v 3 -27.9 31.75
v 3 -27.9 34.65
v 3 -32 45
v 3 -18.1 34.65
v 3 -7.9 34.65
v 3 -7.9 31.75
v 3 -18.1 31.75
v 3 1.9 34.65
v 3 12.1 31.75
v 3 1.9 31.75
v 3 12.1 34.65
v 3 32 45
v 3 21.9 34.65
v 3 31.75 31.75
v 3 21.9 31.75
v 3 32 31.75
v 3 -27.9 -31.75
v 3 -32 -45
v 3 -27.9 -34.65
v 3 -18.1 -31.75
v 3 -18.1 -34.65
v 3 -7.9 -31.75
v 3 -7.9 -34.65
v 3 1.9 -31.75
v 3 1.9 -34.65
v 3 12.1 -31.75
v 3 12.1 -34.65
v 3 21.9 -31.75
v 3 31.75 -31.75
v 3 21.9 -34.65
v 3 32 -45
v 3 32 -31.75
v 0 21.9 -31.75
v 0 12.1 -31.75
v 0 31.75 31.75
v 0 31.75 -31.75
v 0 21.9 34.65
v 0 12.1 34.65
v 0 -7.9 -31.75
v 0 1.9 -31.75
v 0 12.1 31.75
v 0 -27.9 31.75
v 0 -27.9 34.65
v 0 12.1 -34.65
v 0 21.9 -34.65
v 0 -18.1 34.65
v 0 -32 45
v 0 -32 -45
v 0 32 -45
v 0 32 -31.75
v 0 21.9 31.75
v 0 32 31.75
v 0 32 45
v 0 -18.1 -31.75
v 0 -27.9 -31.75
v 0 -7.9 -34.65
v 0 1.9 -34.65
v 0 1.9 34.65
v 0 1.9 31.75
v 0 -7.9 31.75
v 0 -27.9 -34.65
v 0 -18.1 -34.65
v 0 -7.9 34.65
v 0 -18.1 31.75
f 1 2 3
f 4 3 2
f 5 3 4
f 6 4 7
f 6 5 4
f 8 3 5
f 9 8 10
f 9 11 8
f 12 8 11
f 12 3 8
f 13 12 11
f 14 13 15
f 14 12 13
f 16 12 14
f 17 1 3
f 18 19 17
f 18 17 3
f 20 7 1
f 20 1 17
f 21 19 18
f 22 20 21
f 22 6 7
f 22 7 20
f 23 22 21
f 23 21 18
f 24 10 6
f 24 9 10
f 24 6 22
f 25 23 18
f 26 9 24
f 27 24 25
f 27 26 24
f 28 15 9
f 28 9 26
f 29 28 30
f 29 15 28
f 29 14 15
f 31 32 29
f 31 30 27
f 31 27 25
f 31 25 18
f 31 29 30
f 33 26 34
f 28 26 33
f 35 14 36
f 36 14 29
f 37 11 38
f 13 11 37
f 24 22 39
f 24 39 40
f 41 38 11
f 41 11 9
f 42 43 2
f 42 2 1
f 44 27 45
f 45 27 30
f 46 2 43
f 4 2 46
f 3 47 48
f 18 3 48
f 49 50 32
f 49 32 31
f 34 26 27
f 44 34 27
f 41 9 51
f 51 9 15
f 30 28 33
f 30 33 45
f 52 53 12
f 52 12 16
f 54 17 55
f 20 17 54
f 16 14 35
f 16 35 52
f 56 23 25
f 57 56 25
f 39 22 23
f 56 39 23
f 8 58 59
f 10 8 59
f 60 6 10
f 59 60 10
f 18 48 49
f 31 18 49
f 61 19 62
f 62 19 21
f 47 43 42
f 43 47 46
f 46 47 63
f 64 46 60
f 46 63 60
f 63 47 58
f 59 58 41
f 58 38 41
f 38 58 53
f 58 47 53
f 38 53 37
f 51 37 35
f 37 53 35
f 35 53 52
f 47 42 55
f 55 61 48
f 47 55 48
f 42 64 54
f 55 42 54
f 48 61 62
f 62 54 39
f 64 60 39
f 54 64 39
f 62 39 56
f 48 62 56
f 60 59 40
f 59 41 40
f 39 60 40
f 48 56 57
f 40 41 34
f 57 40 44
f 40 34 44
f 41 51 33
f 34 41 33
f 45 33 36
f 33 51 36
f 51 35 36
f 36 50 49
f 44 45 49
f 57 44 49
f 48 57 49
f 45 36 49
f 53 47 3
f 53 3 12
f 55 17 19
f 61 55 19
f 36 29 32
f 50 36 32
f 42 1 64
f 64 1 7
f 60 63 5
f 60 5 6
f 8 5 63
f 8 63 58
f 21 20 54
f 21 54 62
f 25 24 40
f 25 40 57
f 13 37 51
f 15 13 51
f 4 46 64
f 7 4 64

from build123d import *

# Parameters (mm, degrees)
SKETCH1_W           = 90
SKETCH1_H           = 64
BOSS_EXTRUDE1_DEPTH = 3
SKETCH2_W           = 2.9
SKETCH2_H           = 9.8
CUT_EXTRUDE1_DEPTH  = 3
SKETCH4_W           = 63.5
SKETCH4_H           = 0.25
CUT_EXTRUDE2_DEPTH  = 10


with BuildPart() as part:
    # Sketch1 → Boss-Extrude1 (new body)
    with BuildSketch(Plane(origin=(0, 0, 0), x_dir=(0, 0, -1), z_dir=(1, 0, 0))):
        Rectangle(SKETCH1_W, SKETCH1_H)
    extrude(amount=BOSS_EXTRUDE1_DEPTH)

    # Sketch2 → Cut-Extrude1 (cut)
    with BuildSketch(Plane(origin=(3, 0, 0), x_dir=(0, 0, -1), z_dir=(1, 0, 0))):
        with Locations((-33.2, 17)):
            Rectangle(SKETCH2_W, SKETCH2_H)
        with Locations((-33.2, -3)):
            Rectangle(SKETCH2_W, SKETCH2_H)
        with Locations((-33.2, -23)):
            Rectangle(SKETCH2_W, SKETCH2_H)
        with Locations((33.2, -23)):
            Rectangle(SKETCH2_W, SKETCH2_H)
        with Locations((33.2, -3)):
            Rectangle(SKETCH2_W, SKETCH2_H)
        with Locations((33.2, 17)):
            Rectangle(SKETCH2_W, SKETCH2_H)
    extrude(amount=-CUT_EXTRUDE1_DEPTH, mode=Mode.SUBTRACT)

    # Sketch4 → Cut-Extrude2 (cut)
    with BuildSketch(Plane(origin=(3, 0, 0), x_dir=(0, 0, -1), z_dir=(1, 0, 0))):
        with Locations((0, 31.875)):
            Rectangle(SKETCH4_W, SKETCH4_H)
    extrude(amount=-CUT_EXTRUDE2_DEPTH, mode=Mode.SUBTRACT)


solid = part.part
